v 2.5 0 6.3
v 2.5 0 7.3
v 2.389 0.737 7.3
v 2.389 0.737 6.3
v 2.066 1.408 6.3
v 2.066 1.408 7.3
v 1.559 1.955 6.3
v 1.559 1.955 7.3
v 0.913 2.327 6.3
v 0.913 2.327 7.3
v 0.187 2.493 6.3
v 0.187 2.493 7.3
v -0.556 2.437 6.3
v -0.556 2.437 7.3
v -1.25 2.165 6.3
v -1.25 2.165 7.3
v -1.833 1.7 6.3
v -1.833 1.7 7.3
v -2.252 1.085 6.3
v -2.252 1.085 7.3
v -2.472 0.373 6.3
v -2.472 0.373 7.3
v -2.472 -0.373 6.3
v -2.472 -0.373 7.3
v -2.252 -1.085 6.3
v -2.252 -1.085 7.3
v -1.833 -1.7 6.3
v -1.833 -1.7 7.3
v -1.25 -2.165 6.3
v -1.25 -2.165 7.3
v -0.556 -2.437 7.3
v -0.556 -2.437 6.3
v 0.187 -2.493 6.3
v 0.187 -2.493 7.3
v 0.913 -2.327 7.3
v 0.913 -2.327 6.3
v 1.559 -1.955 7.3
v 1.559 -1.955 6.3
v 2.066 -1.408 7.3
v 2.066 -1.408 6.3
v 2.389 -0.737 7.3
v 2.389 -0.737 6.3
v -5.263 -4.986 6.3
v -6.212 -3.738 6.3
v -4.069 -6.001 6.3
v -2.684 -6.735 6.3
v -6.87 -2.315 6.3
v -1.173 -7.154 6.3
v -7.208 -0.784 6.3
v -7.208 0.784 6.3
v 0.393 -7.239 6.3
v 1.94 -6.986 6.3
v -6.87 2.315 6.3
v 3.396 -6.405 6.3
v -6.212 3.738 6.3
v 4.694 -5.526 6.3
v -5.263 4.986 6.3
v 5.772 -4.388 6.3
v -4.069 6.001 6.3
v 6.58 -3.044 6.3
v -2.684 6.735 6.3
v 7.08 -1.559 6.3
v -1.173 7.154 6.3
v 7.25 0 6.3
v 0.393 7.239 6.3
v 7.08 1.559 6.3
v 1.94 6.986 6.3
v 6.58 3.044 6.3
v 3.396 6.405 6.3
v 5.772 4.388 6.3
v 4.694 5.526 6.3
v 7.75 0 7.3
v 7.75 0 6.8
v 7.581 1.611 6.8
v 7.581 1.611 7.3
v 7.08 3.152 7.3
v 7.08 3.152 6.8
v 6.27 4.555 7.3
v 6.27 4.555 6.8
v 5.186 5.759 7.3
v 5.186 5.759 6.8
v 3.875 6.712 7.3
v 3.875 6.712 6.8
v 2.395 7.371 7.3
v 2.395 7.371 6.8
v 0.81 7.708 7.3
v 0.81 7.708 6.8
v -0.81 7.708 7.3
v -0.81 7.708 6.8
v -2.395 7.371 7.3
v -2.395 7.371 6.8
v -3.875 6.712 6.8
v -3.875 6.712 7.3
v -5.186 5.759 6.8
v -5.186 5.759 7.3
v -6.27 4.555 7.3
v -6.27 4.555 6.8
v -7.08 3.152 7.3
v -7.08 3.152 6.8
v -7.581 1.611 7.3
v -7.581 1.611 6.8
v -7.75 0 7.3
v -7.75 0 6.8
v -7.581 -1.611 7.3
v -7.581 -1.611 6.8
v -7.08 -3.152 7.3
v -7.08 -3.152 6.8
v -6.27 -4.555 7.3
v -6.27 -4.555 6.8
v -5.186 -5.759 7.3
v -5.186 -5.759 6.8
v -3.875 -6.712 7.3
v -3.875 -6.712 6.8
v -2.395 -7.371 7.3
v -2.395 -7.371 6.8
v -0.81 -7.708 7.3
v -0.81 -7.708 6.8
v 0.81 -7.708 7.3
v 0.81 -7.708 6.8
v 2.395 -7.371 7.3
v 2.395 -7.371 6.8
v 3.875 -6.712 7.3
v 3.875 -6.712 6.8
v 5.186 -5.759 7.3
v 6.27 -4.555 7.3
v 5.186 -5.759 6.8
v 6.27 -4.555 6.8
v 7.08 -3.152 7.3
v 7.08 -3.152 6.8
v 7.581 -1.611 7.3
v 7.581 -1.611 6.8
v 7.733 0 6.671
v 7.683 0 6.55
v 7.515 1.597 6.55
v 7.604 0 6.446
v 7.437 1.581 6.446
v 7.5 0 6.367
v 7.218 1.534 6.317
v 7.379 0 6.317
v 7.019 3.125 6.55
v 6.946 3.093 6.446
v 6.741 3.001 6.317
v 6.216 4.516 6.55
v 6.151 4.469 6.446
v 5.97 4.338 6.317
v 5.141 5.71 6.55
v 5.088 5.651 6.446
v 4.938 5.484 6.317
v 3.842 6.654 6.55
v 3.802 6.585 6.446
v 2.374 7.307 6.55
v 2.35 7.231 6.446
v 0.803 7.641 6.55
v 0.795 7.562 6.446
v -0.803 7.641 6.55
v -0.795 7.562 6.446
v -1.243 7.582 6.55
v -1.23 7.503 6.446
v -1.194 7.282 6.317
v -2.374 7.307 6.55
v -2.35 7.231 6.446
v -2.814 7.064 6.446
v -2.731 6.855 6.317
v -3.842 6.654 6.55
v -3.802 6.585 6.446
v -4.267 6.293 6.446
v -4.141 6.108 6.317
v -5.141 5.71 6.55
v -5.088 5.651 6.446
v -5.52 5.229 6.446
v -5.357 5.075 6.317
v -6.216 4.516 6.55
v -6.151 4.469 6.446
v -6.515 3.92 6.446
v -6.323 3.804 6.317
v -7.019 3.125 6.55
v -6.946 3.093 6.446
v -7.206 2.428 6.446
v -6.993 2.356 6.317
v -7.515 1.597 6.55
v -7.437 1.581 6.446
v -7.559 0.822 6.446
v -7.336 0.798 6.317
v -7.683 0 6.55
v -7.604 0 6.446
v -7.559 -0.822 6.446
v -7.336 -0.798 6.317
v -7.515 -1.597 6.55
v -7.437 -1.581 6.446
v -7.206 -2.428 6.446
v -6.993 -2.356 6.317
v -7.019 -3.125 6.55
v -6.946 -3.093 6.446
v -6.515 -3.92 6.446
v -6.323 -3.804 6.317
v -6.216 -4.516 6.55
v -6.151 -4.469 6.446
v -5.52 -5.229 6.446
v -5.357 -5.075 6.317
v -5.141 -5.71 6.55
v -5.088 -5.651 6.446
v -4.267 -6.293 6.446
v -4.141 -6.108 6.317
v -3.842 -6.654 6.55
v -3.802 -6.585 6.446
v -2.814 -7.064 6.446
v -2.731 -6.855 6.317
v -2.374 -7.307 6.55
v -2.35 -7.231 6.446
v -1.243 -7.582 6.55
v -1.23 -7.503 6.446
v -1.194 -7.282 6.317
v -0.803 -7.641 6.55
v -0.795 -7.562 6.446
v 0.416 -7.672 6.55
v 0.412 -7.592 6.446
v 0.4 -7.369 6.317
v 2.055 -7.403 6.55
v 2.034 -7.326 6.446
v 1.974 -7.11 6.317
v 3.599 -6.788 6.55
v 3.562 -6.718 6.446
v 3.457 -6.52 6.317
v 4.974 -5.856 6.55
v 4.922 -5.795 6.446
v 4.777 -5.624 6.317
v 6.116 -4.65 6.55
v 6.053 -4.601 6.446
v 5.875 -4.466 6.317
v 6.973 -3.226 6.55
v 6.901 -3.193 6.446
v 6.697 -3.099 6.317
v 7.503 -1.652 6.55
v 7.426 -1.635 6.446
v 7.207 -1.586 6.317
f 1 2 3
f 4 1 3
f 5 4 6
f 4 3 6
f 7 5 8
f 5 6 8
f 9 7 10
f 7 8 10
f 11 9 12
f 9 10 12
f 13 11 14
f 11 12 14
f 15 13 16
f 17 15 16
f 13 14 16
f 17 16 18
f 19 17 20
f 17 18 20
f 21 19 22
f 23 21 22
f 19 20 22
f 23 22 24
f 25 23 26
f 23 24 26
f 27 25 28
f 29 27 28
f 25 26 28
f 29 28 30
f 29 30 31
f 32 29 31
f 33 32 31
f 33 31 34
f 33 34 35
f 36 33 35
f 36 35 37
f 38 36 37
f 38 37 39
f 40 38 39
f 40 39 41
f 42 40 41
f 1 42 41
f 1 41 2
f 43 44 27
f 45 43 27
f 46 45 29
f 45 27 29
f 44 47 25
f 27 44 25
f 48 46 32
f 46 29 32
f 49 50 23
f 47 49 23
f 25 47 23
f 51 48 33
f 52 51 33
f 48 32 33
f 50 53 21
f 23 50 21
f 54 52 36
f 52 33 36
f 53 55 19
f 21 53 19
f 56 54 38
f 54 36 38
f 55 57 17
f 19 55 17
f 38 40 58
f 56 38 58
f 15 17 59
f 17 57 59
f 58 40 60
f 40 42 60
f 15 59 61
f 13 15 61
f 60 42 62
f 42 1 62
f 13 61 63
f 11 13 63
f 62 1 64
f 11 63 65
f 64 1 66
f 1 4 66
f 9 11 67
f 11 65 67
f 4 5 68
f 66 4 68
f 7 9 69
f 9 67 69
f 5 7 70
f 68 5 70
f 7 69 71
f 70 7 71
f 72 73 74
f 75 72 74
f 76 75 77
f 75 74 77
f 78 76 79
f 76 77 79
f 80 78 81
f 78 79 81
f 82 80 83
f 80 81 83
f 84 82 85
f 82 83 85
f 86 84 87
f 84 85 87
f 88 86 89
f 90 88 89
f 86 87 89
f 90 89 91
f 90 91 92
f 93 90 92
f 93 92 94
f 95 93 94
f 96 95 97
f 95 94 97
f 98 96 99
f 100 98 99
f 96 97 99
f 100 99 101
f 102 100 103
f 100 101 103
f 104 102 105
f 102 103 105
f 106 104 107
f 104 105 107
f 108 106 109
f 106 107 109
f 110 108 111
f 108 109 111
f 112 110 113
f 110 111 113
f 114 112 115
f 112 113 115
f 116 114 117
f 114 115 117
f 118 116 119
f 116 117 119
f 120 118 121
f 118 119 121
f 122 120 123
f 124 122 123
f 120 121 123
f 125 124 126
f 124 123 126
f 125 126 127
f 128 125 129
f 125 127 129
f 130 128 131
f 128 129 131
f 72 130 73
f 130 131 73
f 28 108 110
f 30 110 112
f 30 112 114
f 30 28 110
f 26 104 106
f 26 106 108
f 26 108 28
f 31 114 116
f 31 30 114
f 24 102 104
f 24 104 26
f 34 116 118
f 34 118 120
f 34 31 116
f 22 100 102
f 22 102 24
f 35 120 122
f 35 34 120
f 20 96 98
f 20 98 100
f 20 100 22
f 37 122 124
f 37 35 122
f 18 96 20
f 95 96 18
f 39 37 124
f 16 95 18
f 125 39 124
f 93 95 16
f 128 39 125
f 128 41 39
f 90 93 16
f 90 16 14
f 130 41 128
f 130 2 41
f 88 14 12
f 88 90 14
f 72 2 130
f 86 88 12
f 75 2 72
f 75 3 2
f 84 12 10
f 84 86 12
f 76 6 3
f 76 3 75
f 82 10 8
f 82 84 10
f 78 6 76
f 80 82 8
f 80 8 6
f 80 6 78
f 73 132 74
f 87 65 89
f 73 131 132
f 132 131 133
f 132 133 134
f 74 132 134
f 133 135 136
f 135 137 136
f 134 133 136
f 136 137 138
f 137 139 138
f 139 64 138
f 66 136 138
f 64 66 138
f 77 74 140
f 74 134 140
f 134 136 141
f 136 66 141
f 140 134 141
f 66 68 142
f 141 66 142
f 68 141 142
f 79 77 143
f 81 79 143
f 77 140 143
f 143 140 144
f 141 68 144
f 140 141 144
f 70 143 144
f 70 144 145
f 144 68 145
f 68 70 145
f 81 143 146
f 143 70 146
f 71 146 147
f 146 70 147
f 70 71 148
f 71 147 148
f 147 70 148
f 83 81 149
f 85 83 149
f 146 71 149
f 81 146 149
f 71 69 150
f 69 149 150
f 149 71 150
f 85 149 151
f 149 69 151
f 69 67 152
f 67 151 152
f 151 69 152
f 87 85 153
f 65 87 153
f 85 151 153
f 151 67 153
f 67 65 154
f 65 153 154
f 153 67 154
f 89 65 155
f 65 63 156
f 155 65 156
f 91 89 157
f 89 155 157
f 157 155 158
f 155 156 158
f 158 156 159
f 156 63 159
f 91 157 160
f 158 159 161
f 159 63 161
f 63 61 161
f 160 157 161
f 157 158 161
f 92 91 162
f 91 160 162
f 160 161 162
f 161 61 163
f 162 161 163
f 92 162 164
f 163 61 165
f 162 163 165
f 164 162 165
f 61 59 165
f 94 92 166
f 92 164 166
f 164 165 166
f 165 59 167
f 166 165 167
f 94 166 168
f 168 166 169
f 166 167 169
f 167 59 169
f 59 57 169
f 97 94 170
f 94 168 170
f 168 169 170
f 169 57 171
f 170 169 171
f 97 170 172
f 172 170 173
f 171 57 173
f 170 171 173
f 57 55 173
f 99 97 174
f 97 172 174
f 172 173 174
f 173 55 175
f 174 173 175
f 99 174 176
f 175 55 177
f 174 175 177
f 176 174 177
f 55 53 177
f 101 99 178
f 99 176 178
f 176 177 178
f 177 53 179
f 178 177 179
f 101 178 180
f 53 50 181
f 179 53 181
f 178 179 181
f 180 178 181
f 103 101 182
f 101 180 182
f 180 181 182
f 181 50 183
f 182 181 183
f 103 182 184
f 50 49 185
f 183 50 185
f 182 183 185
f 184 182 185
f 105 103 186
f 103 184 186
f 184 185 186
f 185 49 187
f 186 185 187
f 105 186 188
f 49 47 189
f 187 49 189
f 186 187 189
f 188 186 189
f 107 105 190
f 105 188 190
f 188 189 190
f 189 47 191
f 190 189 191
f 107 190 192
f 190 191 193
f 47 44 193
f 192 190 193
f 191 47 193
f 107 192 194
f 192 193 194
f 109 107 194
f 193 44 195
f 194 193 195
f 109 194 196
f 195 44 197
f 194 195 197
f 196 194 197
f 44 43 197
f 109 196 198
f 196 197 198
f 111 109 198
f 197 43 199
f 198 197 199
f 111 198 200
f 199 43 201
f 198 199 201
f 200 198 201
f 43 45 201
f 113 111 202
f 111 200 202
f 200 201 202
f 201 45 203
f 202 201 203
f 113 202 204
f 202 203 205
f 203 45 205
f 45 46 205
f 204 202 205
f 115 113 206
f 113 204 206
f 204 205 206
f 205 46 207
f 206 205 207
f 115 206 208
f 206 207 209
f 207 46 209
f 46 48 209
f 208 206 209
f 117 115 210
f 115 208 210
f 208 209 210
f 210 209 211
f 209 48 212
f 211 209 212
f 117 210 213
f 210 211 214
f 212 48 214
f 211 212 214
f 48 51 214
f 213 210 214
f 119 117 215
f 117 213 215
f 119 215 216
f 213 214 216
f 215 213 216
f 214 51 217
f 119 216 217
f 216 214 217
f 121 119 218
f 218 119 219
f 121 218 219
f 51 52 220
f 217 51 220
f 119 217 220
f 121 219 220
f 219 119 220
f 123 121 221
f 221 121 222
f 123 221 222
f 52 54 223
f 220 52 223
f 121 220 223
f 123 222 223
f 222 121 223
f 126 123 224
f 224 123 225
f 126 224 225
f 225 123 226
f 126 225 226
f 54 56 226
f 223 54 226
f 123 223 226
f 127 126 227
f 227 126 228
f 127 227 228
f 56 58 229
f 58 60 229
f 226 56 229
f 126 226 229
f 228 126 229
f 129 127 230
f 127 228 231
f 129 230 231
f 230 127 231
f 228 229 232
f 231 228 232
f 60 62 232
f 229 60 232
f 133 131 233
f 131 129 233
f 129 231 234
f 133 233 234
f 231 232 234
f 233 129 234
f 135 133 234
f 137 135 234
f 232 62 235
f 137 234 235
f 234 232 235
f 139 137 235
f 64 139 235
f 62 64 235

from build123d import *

# Parameters (mm, degrees)
SKETCH001_R  = 7.75
PAD_DEPTH    = 1
FILLET_R     = 0.5
SKETCH002_R  = 2.5
POCKET_DEPTH = 5


with BuildPart() as part:
    # Sketch001 (on Face1 of CopyInvoluteGear) → Pad (new body)
    with BuildSketch(Plane.XY.offset(6.3)):
        Circle(SKETCH001_R)
    extrude(amount=PAD_DEPTH)

    # Fillet
    fillet_edges = [part.edges().sort_by_distance(p)[0] for p in [
        (-7.75, 0, 6.3),
    ]]
    fillet(fillet_edges, radius=FILLET_R)

    # Sketch002 (on Face3 of Fillet) → Pocket (cut)
    with BuildSketch(Plane.XY.offset(7.3)):
        Circle(SKETCH002_R)
    extrude(amount=-POCKET_DEPTH, mode=Mode.SUBTRACT)


solid = part.part
